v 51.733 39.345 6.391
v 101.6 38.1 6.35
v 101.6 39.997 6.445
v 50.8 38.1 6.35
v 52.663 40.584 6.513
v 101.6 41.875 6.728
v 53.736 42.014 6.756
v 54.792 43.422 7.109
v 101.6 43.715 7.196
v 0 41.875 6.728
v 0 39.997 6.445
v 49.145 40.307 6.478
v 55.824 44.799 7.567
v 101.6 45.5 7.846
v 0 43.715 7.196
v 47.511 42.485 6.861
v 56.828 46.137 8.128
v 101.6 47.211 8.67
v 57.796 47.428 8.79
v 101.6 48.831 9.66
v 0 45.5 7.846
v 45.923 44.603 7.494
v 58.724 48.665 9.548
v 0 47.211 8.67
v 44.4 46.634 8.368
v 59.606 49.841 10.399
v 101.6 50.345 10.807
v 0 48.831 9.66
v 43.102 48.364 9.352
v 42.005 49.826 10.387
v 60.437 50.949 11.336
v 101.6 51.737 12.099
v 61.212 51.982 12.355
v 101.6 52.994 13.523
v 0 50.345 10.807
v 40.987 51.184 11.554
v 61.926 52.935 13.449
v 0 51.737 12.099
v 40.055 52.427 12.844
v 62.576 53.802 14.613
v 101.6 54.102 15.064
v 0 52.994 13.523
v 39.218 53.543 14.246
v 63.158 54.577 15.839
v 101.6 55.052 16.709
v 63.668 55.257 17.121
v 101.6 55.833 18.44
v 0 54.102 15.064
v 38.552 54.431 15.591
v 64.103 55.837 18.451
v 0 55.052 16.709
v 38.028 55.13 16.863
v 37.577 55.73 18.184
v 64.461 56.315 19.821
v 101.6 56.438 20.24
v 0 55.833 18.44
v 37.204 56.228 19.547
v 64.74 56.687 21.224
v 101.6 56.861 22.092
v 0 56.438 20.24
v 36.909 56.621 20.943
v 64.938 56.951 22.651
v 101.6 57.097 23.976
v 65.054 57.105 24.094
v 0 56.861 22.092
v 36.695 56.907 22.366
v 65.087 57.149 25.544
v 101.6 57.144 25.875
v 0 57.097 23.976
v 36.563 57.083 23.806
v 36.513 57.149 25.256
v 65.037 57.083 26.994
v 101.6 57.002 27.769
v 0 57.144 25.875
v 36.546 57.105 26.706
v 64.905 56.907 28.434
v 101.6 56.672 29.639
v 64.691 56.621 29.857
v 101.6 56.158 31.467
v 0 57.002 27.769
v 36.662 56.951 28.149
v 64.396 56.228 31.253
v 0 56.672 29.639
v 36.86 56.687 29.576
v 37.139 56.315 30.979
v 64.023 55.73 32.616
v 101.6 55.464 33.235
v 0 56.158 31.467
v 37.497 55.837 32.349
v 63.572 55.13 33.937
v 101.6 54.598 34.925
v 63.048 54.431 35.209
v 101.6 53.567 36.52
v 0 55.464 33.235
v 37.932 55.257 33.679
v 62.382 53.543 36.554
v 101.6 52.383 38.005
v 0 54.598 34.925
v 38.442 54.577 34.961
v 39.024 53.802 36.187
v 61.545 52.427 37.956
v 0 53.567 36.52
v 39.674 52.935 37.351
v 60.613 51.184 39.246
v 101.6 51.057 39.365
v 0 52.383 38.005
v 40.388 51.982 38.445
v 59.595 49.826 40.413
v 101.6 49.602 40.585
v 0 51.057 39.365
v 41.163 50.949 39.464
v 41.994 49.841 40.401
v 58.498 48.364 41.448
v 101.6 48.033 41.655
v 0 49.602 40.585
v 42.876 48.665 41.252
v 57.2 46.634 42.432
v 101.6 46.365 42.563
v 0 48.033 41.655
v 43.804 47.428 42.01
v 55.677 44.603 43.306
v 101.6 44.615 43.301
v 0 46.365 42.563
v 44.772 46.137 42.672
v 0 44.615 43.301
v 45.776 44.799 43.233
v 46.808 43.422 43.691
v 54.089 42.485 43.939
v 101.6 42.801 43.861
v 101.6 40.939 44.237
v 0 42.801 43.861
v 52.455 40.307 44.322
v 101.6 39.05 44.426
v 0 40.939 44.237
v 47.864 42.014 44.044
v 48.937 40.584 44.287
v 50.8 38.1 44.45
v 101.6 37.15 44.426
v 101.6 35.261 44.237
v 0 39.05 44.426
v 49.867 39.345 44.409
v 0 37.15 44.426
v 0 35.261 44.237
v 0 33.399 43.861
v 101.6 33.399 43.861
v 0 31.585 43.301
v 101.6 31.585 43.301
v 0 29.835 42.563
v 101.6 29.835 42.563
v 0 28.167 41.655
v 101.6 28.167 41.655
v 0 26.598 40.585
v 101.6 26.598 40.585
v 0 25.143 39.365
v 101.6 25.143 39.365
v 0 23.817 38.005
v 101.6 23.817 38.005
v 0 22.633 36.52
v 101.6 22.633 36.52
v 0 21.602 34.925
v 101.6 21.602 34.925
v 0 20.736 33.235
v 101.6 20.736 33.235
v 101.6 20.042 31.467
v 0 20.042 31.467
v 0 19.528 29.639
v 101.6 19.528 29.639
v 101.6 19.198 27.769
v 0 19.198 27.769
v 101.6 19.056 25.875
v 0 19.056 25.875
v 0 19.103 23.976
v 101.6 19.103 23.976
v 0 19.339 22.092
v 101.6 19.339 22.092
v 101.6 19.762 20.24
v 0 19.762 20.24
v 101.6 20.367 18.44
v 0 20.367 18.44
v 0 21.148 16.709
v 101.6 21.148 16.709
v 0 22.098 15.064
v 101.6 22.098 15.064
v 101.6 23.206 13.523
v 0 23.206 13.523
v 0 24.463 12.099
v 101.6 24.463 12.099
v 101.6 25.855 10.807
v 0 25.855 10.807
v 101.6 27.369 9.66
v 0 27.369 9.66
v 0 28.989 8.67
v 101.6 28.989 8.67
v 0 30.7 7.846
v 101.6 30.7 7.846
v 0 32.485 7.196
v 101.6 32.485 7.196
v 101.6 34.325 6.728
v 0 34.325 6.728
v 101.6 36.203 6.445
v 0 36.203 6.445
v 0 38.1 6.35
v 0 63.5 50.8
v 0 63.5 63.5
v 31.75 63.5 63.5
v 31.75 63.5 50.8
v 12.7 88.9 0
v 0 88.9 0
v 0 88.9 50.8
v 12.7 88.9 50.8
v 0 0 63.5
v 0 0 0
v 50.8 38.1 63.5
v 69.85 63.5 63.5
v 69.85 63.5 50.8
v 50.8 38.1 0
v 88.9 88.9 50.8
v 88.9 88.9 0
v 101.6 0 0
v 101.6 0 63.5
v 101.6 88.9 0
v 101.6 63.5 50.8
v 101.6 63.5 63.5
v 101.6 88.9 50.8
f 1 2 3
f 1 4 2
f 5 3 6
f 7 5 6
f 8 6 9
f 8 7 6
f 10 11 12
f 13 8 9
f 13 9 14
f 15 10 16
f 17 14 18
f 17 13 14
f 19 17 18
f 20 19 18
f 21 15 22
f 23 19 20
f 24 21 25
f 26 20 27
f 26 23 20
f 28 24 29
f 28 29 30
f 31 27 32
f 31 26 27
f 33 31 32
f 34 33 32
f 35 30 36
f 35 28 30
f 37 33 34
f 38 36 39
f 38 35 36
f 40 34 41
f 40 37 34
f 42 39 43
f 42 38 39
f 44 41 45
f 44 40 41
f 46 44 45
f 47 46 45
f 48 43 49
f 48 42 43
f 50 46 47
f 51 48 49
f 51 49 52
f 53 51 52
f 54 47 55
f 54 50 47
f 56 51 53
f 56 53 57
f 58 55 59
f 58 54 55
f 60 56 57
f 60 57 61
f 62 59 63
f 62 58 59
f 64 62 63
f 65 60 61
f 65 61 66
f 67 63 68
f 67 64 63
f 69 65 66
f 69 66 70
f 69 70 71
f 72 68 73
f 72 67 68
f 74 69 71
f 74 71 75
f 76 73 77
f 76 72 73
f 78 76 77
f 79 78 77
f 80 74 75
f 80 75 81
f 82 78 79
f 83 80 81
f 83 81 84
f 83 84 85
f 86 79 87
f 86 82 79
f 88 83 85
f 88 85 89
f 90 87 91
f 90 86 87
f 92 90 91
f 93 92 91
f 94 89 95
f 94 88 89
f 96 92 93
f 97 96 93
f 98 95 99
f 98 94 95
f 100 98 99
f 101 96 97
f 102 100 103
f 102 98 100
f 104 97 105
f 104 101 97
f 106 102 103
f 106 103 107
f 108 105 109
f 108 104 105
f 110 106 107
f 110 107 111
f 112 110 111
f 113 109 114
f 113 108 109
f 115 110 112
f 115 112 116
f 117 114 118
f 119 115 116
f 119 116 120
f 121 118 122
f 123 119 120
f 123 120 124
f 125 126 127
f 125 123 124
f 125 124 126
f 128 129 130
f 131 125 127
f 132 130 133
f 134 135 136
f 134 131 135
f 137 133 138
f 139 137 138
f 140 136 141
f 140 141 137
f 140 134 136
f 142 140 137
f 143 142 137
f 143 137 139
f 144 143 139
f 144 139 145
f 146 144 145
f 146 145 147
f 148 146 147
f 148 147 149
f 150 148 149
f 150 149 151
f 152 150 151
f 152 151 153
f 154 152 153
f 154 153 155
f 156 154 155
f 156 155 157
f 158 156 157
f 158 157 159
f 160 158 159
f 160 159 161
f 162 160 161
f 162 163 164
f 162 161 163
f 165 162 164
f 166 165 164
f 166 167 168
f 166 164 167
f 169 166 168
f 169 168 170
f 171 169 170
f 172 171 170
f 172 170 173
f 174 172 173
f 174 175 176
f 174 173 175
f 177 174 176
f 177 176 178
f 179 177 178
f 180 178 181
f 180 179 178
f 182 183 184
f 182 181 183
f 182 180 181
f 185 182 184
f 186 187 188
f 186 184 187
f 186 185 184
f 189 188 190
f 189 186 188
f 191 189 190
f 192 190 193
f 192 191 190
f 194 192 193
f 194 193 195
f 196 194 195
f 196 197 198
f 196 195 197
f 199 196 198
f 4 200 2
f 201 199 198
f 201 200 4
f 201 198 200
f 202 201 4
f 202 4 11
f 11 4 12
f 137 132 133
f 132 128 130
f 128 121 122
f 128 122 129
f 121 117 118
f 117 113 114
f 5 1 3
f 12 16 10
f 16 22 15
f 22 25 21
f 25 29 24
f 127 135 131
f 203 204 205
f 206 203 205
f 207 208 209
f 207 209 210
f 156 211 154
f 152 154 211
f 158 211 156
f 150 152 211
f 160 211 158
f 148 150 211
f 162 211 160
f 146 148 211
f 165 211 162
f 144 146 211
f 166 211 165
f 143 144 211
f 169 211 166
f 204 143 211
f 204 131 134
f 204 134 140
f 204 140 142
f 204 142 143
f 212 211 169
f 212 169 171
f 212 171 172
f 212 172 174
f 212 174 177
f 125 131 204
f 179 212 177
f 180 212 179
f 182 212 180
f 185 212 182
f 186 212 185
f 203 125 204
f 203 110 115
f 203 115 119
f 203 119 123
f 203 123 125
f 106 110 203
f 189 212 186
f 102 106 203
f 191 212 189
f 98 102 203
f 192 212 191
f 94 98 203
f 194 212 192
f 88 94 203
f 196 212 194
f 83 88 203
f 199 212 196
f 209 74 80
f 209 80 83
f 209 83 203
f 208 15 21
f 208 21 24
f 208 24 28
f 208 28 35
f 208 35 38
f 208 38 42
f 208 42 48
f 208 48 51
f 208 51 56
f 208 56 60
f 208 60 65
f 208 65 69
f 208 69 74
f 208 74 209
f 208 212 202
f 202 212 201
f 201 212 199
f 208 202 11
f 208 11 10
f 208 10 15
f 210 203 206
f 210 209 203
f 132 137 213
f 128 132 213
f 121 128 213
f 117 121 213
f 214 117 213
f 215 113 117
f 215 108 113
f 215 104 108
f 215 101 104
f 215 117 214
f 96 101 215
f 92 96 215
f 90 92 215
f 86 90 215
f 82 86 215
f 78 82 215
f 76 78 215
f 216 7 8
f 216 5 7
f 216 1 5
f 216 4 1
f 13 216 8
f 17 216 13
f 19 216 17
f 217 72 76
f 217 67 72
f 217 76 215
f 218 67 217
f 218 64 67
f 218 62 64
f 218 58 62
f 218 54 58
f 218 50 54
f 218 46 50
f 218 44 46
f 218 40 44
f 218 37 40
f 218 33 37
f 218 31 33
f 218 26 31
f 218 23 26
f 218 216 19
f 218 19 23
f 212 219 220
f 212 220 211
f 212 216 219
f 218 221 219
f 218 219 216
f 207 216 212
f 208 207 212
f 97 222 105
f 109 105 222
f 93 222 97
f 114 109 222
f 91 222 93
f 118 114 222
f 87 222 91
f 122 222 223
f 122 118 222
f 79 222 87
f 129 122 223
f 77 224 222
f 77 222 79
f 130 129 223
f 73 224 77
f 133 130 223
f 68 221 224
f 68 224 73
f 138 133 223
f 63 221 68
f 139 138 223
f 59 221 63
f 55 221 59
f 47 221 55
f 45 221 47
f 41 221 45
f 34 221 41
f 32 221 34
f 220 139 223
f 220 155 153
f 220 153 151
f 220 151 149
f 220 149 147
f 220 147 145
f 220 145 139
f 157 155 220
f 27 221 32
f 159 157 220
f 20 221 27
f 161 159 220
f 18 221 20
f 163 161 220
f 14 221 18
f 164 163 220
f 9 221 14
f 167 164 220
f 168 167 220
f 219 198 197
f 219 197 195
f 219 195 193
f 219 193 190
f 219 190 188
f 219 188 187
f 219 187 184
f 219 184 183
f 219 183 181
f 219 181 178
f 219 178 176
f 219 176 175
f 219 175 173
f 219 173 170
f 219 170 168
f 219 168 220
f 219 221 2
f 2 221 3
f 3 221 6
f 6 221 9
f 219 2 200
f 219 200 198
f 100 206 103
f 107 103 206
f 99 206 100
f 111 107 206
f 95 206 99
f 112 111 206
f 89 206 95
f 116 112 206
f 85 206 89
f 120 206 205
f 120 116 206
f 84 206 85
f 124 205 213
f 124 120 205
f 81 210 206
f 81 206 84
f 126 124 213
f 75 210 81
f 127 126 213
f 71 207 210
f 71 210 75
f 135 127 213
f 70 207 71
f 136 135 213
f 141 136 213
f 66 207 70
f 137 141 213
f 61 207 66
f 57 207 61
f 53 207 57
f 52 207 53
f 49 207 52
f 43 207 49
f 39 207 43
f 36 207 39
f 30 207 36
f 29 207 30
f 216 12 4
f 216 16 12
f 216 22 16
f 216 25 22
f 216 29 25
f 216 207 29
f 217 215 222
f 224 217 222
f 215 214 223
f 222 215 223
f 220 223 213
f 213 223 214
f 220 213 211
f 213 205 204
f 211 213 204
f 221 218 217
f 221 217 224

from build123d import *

# Parameters (mm, degrees)
BOSS_EXTRUDE1_DEPTH = 63.5
SKETCH2_R           = 19.05
CUT_EXTRUDE1_DEPTH  = 102.6
CUT_EXTRUDE2_DEPTH  = 12.7


with BuildPart() as part:
    # Sketch1 → Boss-Extrude1 (new body)
    with BuildSketch(Plane.XY):
        Polygon((0, 0), (0, 88.9), (12.7, 88.9), (50.8, 38.1), (88.9, 88.9), (101.6, 88.9), (101.6, 0), align=None)
    extrude(amount=BOSS_EXTRUDE1_DEPTH)

    # Sketch2 → Cut-Extrude1 (cut, through all)
    with BuildSketch(Plane(origin=(0, 0, 0), x_dir=(0, 0, -1), z_dir=(1, 0, 0))):
        with Locations((-25.4, 38.1)):
            Circle(SKETCH2_R)
    extrude(amount=CUT_EXTRUDE1_DEPTH, mode=Mode.SUBTRACT)

    # Sketch3 → Cut-Extrude2 (cut)
    with BuildSketch(Plane.XY.offset(63.5)):
        Polygon((0, 63.5), (31.75, 63.5), (12.7, 88.9), (0, 88.9), align=None)
        Polygon((69.85, 63.5), (101.6, 63.5), (101.6, 88.9), (88.9, 88.9), align=None)
    extrude(amount=-CUT_EXTRUDE2_DEPTH, mode=Mode.SUBTRACT)


solid = part.part
